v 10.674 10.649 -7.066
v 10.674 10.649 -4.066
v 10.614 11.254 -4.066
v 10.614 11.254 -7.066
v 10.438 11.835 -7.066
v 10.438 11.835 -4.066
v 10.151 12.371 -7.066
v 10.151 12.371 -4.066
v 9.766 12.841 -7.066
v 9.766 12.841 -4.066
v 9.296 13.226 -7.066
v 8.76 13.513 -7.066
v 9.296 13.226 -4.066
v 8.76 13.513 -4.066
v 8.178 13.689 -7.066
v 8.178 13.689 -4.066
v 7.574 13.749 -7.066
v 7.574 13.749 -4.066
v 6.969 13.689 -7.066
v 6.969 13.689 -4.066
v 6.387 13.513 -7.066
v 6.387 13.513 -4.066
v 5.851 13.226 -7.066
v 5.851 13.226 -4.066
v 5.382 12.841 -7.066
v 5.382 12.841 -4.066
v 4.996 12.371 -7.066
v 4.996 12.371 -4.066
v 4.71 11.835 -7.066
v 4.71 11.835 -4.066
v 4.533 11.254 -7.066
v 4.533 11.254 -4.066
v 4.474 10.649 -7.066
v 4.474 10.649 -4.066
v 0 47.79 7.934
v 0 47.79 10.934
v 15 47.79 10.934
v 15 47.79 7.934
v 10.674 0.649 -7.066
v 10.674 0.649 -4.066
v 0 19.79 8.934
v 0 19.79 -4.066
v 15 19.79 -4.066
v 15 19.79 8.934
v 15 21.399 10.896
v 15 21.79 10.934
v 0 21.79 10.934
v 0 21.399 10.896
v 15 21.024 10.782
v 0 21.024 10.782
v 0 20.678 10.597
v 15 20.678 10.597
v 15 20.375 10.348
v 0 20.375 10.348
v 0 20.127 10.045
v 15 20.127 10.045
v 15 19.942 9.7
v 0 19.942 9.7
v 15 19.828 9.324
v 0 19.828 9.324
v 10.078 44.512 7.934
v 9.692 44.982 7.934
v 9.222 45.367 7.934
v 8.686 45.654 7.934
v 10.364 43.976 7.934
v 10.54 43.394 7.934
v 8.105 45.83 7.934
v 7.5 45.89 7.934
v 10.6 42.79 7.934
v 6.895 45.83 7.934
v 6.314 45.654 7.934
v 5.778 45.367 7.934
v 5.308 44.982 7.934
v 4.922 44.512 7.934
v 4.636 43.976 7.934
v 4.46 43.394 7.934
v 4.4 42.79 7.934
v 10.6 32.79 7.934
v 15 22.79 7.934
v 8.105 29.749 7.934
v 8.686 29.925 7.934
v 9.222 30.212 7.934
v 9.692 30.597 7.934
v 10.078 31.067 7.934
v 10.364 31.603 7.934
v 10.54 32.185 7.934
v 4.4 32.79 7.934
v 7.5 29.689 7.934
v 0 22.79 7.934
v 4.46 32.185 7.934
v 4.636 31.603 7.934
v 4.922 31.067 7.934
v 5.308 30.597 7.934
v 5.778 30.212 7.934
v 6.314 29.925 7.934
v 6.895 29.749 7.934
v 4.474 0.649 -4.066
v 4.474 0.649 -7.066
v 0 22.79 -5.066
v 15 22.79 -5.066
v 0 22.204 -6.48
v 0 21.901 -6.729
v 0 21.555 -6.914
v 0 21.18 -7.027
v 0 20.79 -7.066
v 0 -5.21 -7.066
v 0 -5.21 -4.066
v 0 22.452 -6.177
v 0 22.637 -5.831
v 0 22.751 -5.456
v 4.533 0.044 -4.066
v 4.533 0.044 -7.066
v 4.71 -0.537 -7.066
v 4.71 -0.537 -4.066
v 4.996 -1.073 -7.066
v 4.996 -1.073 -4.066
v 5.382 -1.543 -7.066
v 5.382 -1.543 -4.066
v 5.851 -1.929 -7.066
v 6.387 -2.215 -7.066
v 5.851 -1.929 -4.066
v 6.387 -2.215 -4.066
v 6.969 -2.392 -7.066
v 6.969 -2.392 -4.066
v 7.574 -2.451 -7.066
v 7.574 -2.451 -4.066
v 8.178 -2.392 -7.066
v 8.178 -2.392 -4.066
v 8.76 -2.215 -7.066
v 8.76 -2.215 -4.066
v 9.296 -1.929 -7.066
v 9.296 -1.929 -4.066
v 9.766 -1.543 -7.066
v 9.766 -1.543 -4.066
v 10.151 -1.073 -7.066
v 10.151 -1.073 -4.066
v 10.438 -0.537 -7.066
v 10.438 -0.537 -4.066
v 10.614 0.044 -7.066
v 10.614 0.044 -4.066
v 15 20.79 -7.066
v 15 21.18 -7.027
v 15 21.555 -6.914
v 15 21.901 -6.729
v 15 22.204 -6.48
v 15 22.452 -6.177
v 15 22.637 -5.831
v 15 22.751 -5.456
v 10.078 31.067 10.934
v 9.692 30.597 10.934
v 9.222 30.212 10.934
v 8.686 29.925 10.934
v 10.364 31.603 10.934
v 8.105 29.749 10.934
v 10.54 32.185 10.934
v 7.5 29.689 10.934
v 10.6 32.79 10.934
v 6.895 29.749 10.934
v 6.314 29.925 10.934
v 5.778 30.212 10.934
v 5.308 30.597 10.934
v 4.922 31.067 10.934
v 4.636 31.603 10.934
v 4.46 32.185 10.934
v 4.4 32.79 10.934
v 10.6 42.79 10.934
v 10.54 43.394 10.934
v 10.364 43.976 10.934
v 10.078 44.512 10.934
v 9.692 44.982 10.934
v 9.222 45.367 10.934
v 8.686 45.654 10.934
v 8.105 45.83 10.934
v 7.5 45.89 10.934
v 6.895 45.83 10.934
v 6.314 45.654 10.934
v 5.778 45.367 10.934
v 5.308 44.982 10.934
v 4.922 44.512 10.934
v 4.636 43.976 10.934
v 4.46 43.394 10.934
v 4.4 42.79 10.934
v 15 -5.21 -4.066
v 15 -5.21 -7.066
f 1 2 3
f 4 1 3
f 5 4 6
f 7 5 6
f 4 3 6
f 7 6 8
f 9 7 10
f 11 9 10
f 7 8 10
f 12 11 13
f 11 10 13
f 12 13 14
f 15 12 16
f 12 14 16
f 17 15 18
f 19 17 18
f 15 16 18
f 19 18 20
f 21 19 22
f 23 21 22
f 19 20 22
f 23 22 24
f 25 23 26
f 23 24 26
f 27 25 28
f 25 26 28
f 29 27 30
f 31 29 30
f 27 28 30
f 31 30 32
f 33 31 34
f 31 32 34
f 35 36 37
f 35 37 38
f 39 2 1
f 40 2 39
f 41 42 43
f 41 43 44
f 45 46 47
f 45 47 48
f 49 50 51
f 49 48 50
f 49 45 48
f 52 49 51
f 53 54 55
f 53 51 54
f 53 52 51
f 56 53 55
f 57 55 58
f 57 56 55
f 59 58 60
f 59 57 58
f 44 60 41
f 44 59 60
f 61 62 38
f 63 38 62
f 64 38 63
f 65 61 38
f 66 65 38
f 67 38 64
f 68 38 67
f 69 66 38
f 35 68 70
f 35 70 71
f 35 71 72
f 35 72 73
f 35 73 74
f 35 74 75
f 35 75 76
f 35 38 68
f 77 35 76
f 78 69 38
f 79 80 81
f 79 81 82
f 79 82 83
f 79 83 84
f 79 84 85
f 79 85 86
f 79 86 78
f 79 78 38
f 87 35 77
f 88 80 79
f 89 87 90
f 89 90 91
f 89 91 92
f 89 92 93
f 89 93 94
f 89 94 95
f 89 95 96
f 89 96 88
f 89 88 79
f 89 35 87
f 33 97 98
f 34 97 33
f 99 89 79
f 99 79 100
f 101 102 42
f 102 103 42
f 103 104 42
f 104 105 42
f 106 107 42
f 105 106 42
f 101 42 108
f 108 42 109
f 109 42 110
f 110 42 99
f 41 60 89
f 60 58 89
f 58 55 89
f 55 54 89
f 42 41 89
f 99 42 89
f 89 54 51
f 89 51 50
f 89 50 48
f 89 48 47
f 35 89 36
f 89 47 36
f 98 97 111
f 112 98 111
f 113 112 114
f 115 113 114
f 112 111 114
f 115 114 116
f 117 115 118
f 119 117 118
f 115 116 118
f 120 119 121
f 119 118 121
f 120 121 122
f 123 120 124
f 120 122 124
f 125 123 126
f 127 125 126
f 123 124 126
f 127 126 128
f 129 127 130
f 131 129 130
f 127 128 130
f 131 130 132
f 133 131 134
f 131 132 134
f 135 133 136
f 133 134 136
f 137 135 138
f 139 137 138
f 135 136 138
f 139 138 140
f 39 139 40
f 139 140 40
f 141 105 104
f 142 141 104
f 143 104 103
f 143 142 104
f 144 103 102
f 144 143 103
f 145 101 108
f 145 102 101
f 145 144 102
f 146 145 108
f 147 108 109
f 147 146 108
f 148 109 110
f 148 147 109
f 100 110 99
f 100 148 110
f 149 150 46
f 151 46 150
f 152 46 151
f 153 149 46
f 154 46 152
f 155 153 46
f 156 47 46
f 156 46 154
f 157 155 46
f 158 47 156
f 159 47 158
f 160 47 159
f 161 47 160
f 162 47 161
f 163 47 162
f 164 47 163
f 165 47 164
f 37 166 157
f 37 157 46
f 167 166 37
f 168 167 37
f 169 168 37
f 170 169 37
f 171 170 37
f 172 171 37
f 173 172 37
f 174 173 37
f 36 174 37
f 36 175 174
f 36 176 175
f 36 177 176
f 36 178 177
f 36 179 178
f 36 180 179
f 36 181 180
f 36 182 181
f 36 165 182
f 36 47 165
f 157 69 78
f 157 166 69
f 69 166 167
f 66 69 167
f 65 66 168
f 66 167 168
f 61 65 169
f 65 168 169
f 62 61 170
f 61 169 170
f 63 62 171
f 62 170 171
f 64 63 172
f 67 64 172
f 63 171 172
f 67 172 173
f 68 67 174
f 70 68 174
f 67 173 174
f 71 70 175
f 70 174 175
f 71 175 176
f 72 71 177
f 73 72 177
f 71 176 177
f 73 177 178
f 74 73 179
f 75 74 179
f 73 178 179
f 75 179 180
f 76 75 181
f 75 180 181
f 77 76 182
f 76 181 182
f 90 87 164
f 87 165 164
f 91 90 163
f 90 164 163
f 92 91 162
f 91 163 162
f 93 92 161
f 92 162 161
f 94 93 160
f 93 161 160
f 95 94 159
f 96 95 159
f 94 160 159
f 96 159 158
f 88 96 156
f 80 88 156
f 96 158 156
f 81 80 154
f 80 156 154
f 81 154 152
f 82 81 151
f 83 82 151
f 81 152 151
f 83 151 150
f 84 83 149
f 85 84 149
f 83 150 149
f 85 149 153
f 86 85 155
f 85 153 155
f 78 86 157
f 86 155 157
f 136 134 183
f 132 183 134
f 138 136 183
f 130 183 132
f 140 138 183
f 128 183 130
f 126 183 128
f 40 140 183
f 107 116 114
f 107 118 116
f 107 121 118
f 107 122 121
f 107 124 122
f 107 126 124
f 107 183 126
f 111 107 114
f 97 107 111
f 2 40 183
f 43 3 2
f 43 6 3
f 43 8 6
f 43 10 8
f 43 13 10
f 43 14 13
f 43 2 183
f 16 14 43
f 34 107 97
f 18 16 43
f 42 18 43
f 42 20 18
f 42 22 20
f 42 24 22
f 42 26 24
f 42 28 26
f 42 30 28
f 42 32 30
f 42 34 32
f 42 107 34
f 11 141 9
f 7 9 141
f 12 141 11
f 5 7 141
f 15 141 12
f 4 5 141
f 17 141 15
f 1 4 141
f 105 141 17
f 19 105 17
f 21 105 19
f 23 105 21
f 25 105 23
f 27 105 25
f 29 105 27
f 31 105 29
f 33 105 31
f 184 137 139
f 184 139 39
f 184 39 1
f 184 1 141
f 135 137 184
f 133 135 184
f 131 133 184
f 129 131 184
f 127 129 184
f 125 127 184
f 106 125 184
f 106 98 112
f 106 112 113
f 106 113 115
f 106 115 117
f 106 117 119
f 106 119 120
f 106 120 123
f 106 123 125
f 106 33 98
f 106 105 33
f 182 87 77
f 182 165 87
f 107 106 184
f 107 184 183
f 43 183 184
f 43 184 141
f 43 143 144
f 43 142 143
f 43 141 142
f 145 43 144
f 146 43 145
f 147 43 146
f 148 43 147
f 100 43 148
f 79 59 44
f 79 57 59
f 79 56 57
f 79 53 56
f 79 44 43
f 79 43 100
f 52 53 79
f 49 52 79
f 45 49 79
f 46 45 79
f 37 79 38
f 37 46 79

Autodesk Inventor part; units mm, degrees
ref_plane "YZ Plane" through (0, 0, 0) normal (1, 0, 0) x (0, 1, 0)
ref_plane "XZ Plane" through (0, 0, 0) normal (0, 1, 0) x (-1, 0, 0)
ref_plane "XY Plane" through (0, 0, 0) normal (0, 0, 1) x (1, 0, 0)
sketch "Sketch1" plane through (0, 0, 0) normal (1, 0, 0) x (0, 1, 0)
  line L0 (47.7895, 7.9342) -> (22.7895, 7.9342)
  line L1 (22.7895, 7.9342) -> (22.7895, -7.0658)
  line L2 (22.7895, -7.0658) -> (-5.2105, -7.0658)
  line L3 (-5.2105, -7.0658) -> (-5.2105, -4.0658)
  line L4 (-5.2105, -4.0658) -> (19.7895, -4.0658)
  line L5 (19.7895, -4.0658) -> (19.7895, 10.9342)
  line L6 (19.7895, 10.9342) -> (47.7895, 10.9342)
  line L7 (47.7895, 10.9342) -> (47.7895, 7.9342)
  point P0 (0, 0)
  dimension "d0" = 3
  dimension "d1" = 3
  dimension "d2" = 3
  dimension "d3" = 15
  dimension "d4" = 25
  dimension "d5" = 25
extrude "Extrusion1" add sketch "Sketch1" along normal blind 15
fillet "Fillet1" radius 2 2 edges at (7.5, 22.7895, -7.0658) (7.5, 19.7895, 10.9342)
sketch "Sketch2" plane through (0, 47.7895, 10.9342) normal (0, 0, 1) x (1, 0, 0)
  arc A0 (10.6, -5) -> (4.4, -5) centre (7.5, -5) ccw
  line L0 (0, 0) -> (15, 0) projected
  arc A1 (4.4, -15) -> (10.6, -15) centre (7.5, -15) ccw
  line L1 (4.4, -15) -> (4.4, -5)
  line L2 (10.6, -5) -> (10.6, -15)
  line L3 (15, 0) -> (15, -26) projected
  arc A2 (10.6737, -37.1406) -> (4.4737, -37.1406) centre (7.5737, -37.1406) ccw
  line L4 (16.7377, 8.0467) -> (15.0737, 2.8292)
  arc A3 (4.4737, -47.1406) -> (10.6737, -47.1406) centre (7.5737, -47.1406) ccw
  line L5 (4.4737, -47.1406) -> (4.4737, -37.1406)
  line L6 (10.6737, -37.1406) -> (10.6737, -47.1406)
  line L7 (15.0737, 2.8292) -> (15.0737, -23.1708)
  point P0 (0, -47.7895)
  dimension "d9" = 6.2
  dimension "d10" = 5
  dimension "d11" = 6.2
  dimension "d12" = 10
  dimension "d13" = 7.5
  dimension "d15" = 7.5
  dimension "d16" = 6.2
  dimension "d17" = 5
  dimension "d18" = 6.2
  dimension "d19" = 10
  dimension "d20" = 7.5
  dimension "d21" = 7.5
extrude "Extrusion2" cut sketch "Sketch2" against normal blind 20
properties part number "Side holding bracket"
